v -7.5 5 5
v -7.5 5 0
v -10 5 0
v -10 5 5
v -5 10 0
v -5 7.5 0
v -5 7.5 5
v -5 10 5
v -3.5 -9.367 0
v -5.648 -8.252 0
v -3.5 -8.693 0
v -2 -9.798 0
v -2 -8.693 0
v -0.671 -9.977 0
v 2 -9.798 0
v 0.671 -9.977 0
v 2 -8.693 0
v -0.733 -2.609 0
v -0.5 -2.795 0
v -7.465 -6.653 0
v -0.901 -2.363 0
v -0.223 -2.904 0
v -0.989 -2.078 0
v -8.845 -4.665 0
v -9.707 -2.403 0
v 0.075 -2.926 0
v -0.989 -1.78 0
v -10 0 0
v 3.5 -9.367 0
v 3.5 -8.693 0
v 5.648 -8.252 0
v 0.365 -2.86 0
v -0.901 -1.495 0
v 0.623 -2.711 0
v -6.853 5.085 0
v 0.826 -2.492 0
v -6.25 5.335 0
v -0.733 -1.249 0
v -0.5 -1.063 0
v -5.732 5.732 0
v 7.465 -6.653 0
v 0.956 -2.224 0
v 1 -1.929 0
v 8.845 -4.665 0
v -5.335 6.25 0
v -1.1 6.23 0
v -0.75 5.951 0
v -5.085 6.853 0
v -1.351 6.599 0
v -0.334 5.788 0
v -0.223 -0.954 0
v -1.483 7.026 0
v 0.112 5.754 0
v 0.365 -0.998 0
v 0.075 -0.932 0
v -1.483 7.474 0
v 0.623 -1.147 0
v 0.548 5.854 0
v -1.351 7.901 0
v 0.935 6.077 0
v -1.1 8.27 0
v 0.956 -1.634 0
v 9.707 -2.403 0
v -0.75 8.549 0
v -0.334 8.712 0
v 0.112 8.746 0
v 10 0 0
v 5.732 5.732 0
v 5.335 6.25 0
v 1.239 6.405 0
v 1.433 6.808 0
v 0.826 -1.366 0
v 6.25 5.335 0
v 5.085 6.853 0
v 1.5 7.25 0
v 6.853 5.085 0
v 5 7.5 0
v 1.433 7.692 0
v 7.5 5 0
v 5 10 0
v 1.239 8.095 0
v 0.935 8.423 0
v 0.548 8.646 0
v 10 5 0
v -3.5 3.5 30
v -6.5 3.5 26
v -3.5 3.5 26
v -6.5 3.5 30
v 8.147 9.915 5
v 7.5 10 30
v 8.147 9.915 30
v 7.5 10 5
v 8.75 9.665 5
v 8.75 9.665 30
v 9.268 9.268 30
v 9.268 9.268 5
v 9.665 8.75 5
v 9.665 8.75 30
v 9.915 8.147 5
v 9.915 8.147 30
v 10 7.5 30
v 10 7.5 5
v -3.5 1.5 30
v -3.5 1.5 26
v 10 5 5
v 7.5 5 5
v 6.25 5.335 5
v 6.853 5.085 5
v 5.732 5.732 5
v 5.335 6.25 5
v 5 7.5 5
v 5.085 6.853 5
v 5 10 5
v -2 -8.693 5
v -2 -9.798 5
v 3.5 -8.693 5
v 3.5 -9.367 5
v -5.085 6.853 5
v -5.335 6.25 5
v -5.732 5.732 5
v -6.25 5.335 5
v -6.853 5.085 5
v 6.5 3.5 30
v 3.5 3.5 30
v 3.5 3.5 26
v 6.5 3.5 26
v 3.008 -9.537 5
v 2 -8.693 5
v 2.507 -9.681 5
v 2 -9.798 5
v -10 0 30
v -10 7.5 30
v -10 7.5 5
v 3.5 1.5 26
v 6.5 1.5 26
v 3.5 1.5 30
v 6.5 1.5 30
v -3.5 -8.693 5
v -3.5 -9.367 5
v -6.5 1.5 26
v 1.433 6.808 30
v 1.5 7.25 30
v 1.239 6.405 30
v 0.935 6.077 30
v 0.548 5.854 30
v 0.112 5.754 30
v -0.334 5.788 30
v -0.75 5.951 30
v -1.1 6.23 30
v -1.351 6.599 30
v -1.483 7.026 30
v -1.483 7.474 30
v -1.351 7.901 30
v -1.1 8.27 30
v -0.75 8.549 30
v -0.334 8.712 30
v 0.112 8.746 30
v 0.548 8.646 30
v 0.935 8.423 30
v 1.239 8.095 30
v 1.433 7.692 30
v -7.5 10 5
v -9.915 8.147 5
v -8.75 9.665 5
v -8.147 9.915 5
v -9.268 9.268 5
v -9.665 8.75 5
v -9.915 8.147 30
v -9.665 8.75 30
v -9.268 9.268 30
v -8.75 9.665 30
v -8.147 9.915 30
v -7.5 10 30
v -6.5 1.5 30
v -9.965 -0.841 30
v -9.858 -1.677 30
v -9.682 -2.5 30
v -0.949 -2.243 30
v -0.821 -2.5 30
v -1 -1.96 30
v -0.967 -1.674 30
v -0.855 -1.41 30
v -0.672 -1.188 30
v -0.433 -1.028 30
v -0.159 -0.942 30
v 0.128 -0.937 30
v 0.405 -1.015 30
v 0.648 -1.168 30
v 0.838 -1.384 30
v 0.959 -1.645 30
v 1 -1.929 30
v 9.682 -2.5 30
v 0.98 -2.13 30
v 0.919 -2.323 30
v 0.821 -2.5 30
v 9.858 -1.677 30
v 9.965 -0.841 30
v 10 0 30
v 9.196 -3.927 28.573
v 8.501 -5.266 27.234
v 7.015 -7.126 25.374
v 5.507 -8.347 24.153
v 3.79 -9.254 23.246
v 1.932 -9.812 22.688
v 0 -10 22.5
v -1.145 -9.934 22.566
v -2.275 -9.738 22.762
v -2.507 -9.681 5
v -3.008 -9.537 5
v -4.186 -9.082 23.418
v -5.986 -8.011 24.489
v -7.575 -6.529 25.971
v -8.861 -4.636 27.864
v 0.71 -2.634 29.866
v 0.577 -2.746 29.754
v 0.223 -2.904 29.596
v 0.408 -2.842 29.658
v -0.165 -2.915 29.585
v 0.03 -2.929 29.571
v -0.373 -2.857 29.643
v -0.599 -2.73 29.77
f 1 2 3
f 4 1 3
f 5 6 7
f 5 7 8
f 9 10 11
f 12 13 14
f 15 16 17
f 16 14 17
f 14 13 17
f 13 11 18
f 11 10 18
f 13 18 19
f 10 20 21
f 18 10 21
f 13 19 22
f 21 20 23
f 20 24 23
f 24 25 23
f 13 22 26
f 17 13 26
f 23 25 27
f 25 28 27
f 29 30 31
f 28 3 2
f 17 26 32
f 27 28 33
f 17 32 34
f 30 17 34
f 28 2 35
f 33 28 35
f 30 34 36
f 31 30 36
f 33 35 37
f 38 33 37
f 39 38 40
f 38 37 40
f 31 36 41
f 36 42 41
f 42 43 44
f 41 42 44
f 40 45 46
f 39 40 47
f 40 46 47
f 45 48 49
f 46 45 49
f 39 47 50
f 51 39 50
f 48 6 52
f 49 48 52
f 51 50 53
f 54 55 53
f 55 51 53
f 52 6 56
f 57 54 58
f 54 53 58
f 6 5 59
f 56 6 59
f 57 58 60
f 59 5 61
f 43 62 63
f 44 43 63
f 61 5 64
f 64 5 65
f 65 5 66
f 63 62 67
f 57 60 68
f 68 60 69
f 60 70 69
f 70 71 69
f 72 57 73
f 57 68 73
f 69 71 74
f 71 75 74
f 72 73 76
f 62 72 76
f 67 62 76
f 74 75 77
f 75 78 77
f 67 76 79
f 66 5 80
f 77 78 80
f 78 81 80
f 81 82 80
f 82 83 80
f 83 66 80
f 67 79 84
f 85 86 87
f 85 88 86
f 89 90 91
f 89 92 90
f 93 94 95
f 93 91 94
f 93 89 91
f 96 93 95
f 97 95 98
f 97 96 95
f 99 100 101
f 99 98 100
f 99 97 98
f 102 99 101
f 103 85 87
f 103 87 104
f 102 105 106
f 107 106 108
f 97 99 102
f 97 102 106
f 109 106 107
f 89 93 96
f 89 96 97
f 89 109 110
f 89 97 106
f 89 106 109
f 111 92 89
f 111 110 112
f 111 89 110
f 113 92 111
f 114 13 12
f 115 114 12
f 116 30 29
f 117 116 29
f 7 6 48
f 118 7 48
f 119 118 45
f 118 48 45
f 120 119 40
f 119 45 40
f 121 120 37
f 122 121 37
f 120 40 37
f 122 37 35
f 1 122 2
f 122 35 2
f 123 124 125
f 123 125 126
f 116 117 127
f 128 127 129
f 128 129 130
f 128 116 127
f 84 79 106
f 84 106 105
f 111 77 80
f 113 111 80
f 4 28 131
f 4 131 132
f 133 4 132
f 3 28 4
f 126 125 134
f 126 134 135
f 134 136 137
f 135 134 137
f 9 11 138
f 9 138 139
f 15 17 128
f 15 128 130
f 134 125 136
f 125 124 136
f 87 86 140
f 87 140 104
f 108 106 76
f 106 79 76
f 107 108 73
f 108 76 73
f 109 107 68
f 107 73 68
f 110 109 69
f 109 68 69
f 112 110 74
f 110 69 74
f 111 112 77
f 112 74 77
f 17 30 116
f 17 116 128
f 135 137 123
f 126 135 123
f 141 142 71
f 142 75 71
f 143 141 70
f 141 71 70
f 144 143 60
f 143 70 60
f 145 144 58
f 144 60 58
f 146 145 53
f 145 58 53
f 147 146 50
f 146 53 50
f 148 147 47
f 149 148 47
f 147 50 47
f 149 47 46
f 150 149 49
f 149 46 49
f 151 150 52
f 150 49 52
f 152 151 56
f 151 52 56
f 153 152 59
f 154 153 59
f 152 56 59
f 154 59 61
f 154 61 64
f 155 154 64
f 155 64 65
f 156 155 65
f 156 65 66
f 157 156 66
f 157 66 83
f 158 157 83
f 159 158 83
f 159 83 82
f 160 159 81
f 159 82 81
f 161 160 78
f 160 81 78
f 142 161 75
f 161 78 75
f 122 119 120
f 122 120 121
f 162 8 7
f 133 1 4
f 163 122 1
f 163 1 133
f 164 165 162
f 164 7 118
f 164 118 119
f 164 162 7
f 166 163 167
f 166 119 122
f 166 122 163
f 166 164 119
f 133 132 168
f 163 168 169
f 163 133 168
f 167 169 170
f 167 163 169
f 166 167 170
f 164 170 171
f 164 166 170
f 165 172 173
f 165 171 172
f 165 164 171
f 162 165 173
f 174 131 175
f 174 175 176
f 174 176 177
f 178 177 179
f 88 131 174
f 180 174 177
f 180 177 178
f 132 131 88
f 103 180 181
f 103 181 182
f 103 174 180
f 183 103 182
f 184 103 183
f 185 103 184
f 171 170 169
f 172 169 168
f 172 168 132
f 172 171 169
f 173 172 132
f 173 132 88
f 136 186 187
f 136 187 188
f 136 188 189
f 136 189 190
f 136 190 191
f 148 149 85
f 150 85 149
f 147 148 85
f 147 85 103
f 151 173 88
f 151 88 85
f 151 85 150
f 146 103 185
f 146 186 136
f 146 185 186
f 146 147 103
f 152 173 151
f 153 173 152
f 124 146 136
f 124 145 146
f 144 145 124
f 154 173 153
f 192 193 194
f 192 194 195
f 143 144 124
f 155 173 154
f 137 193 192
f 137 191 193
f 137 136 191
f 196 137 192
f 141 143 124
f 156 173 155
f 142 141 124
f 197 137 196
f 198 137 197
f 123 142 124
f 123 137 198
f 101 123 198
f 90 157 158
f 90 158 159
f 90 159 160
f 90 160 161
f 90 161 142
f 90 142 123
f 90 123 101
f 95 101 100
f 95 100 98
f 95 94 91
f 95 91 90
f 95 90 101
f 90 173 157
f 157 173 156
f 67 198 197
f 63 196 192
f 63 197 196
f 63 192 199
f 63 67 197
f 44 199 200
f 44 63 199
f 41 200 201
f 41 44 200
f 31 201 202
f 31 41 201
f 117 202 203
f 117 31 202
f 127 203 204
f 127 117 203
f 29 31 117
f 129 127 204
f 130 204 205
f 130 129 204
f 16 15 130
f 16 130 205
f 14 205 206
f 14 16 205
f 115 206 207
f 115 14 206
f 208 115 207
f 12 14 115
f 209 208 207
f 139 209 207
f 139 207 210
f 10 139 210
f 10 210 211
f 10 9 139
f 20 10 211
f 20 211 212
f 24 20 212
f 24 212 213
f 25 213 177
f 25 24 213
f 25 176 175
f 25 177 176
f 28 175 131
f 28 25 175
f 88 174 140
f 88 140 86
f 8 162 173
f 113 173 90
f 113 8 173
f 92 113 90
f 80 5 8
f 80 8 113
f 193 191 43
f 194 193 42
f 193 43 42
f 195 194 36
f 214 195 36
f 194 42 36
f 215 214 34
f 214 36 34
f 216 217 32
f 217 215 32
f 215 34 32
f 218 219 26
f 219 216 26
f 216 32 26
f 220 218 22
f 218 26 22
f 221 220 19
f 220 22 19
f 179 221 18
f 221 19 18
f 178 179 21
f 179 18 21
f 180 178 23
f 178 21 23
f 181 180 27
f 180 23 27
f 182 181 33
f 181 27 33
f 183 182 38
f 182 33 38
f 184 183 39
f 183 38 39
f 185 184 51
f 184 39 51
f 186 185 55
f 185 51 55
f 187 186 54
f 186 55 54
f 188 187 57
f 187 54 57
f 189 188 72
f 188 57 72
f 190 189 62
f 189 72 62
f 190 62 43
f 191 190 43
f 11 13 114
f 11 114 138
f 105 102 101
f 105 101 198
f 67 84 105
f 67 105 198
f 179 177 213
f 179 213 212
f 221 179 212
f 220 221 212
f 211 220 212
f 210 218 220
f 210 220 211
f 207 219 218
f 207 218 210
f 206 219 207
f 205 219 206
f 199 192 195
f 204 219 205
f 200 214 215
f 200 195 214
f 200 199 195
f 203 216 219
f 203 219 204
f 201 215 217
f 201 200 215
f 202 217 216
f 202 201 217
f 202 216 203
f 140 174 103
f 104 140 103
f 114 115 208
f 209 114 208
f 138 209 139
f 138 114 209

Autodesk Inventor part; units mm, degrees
ref_plane "YZ Plane" through (0, 0, 0) normal (1, 0, 0) x (0, 1, 0)
ref_plane "XZ Plane" through (0, 0, 0) normal (0, 1, 0) x (-1, 0, 0)
ref_plane "XY Plane" through (0, 0, 0) normal (0, 0, 1) x (1, 0, 0)
sketch "Finger Body" plane through (0, 0, 0) normal (0, 0, 1) x (1, 0, 0)
  line L0 (-10, 10) -> (10, 10)
  line L1 (10, 10) -> (10, -10)
  line L2 (10, -10) -> (-10, -10)
  line L3 (-10, -10) -> (-10, 10)
  arc A0 (-10, 0) -> (10, 0) centre (0, 0) ccw
  line L4 (-10, 0) -> (10, 0)
  circle A1 centre (-7.5, 7.5) radius 2.5
  circle A2 centre (7.5, 7.5) radius 2.5
  circle A3 centre (0, 0) radius 8.75
  line L5 (0, -8.75) -> (1, -8.75) construction
  line L6 (1, 8.6927) -> (1, -8.75)
  line L7 (-1, 8.6927) -> (-1, -8.6927)
  line L8 (-1, -9.9499) -> (-1, -10)
  circle A4 centre (0, 7.25) radius 1.5
  circle A5 centre (0, -1.929) radius 1
  point P0 (1, -8.6927)
  point P1 (10, 7.5)
  point P2 (7.5, 10)
  point P3 (-7.5, 10)
  point P4 (-10, 7.5)
  dimension "d0" = 20
  dimension "d1" = 20
  dimension "d2" = 10
  dimension "d3" = 10
  dimension "d4" = 5
  dimension "d5" = 2.5
  dimension "d6" = 2.5
  dimension "d7" = 5
  dimension "d8" = 2.5
  dimension "d9" = 2.5
  dimension "d10" = 17.5
  dimension "d42" = 3
  dimension "d43" = 0
  dimension "d44" = 0
  dimension "d45" = 9.179
  dimension "d46" = 0
sketch "Cap Imprint (DNE)" plane through (0, 0, 0) normal (0, 0, 1) x (1, 0, 0)
  circle A0 centre (0, 0) radius 8.75 projected
  arc A1 (-10, 0) -> (10, 0) centre (0, 0) ccw projected
  line L0 (-10, -10) -> (-10, 10) projected
  line L1 (-10, 10) -> (10, 10) projected
  line L2 (10, 10) -> (10, -10) projected
  line L3 (1, 8.6927) -> (1, -8.75) projected
  line L4 (-1, 8.6927) -> (-1, -8.6927) projected
  circle A2 centre (-7.5, 7.5) radius 2.5 projected
  circle A3 centre (7.5, 7.5) radius 2.5 projected
  circle A4 centre (0, 0) radius 0.5
  dimension "d15" = 1
extrude "FingerLength (Scale for each finger)" add sketch "Finger Body" along normal blind 30 contours L0 A2 A3 A1 | A1 A3 | A1 A3 L4 L3 | A2 A3 | L4 A3 A0 | A3 A1 | A1 A3 L7 A4 L4 | L1 L4 A3 A2 | A3 A2 | A2 A3 L4 L6 A4 | L4 L7 A3 | L6 A4 A3 | A3 A4 L7 | L7 A4 L6 L4 | L4 L6 A5 L7 | L7 A5 L6 A3 | A3 L6 L4
sketch "Sketch3" plane through (0, 0, 30) normal (0, 0, 1) x (1, 0, 0)
  arc A0 (-7.5, 10) -> (-10, 7.5) centre (-7.5, 7.5) ccw projected
  line L0 (-10, 7.5) -> (-7, 7.5)
  line L1 (-7, 7.5) -> (-6.5, 7.5)
  line L2 (-6.5, 7.5) -> (-3.5, 7.5)
  line L3 (-3.5, 7.5) -> (-3, 7.5)
  arc A1 (10, 7.5) -> (7.5, 10) centre (7.5, 7.5) ccw projected
  line L4 (10, 7.5) -> (7, 7.5)
  line L5 (7, 7.5) -> (6.5, 7.5)
  line L6 (6.5, 7.5) -> (3.5, 7.5)
  line L7 (3.5, 7.5) -> (3, 7.5)
  line L8 (-6.5, 7.5) -> (-3.5, 7.5)
  line L9 (-3.5, 7.5) -> (-3.5, -2.5)
  line L10 (-3.5, -2.5) -> (-6.5, -2.5)
  line L11 (-6.5, -2.5) -> (-6.5, 7.5)
  line L12 (6.5, 7.5) -> (3.5, 7.5)
  line L13 (3.5, 7.5) -> (3.5, -2.5)
  line L14 (3.5, -2.5) -> (6.5, -2.5)
  line L15 (6.5, -2.5) -> (6.5, 7.5)
  line L16 (-6.5, 2.5) -> (6.5, 2.5)
  line L17 (-6.5, 3.5) -> (6.5, 3.5)
  line L18 (-6.5, 1.5) -> (6.5, 1.5)
  point P0 (0, 0)
  point P1 (-3.5, 1.5)
  point P2 (-3.5, 3.5)
  point P3 (3.5, 1.5)
  point P4 (3.5, 3.5)
  dimension "d18" = 3
  dimension "d19" = 0.5
  dimension "d20" = 3
  dimension "d21" = 0.5
  dimension "d22" = 3
  dimension "d23" = 0.5
  dimension "d24" = 3
  dimension "d25" = 0.5
  dimension "d26" = 10
  dimension "d27" = 10
  dimension "d28" = 1
  dimension "d29" = 1
extrude "Extrusion2" cut sketch "Sketch3" against normal blind 4 contours L17 L9 L16 L11 | L16 L9 L18 L11 | L17 L15 L16 L13 | L16 L15 L18 L13
sketch "Sketch4" plane through (10, 0, 0) normal (1, 0, 0) x (0, 0, -1)
  line L0 (0, -10) -> (-30, -10) projected
  line L1 (-30, 0) -> (-30, -10) projected
  line L2 (-30, 0) -> (-30, 7.5) projected
  line L3 (-30, 10) -> (-30, 7.5) projected
  line L4 (0, 10) -> (-30, 10) projected
  line L5 (0, 0) -> (0, 7.5) projected
  line L6 (0, 10) -> (0, 7.5) projected
  line L7 (0, 0) -> (0, -10) projected
  line L8 (0, 7.5) -> (-30, 7.5) projected
  line L9 (-30, 7.5) -> (-30, -2.5)
  line L10 (-30, -8.6927) -> (-30, 8.6927) projected
  line L11 (-30, -2.5) -> (-22.5, -10)
  dimension "d32" = 10
  dimension "d33" = 135
extrude "Extrusion3" cut sketch "Sketch4" against normal up to surface (20 mm away) contours L0 L1 L11
sketch "Sketch5" plane through (0, 0, 0) normal (0, 0, -1) x (-1, 0, 0)
  arc A0 (-7.5, 10) -> (-10, 7.5) centre (-7.5, 7.5) ccw projected
  line L0 (-10, 0) -> (-10, 7.5) projected
  arc A1 (-10, 0) -> (10, 0) centre (0, 0) ccw projected
  line L1 (10, 7.5) -> (10, 0) projected
  arc A2 (10, 7.5) -> (7.5, 10) centre (7.5, 7.5) ccw projected
  line L2 (-7.5, 10) -> (7.5, 10) projected
  circle A3 centre (-7.5, 7.5) radius 2.5
  circle A4 centre (7.5, 7.5) radius 2.5
  line L3 (-7.5, 5) -> (-10, 5)
  line L4 (-10, 0) -> (-10, 7.5) projected
  line L5 (7.5, 5) -> (10, 5)
  line L6 (-5, 7.5) -> (-5, 10)
  line L7 (5, 7.5) -> (5, 10)
  line L8 (-1, -8.6927) -> (-1, -9.9499)
  line L9 (1, -8.6927) -> (1, -9.9499)
  line L10 (-2, -8.6927) -> (-2, -9.9499)
  line L11 (-3.5, -8.6927) -> (-3.5, -9.9499)
  line L12 (2, -8.6927) -> (2, -9.9499)
  line L13 (3.5, -8.6927) -> (3.5, -9.9499)
  line L14 (-3.5, -8.6927) -> (-2, -8.6927)
  line L15 (2, -8.6927) -> (3.5, -8.6927)
  point P0 (2, -9.798)
  point P1 (3.5, -9.3675)
  point P2 (-3.5, -9.3675)
  point P3 (-2, -9.798)
  dimension "d38" = 1
  dimension "d39" = 1.5
  dimension "d40" = 1
  dimension "d41" = 1.5
extrude "Extrusion4" cut sketch "Sketch5" against normal blind 5 contours A3 A0 | L2 L6 A3 | A3 L3 L0 | L2 A4 L7 | A2 A4 | L11 L14 L10 A1 | L1 L5 A4 | A1 L12 L15 L13
sketch "End Imprint (DNE)" plane through (0, 0, 0) normal (0, 0, -1) x (-1, 0, 0)
  line L0 (-5, 10) -> (-5, 7.5) projected
  arc A0 (-7.5, 5) -> (-5, 7.5) centre (-7.5, 7.5) ccw projected
  line L1 (-7.5, 5) -> (-10, 5) projected
  line L2 (-10, 0) -> (-10, 5) projected
  arc A1 (-10, 0) -> (-3.5, -9.3675) centre (0, 0) ccw projected
  line L3 (-3.5, -9.3675) -> (-3.5, -8.6927) projected
  line L4 (-3.5, -8.6927) -> (-2, -8.6927) projected
  line L5 (-2, -8.6927) -> (-2, -9.798) projected
  arc A2 (-2, -9.798) -> (2, -9.798) centre (0, 0) ccw projected
  line L6 (2, -9.798) -> (2, -8.6927) projected
  line L7 (2, -8.6927) -> (3.5, -8.6927) projected
  line L8 (3.5, -8.6927) -> (3.5, -9.3675) projected
  arc A3 (3.5, -9.3675) -> (10, 0) centre (0, 0) ccw projected
  line L9 (10, 5) -> (10, 0) projected
  line L10 (10, 5) -> (7.5, 5) projected
  arc A4 (5, 7.5) -> (7.5, 5) centre (7.5, 7.5) ccw projected
  line L11 (5, 7.5) -> (5, 10) projected
  line L12 (-5, 10) -> (5, 10) projected
  arc A5 (-7.5, 5) -> (-5, 7.5) centre (-7.5, 7.5) ccw projected
  line L13 (-5, 10) -> (-5, 7.5) projected
  line L14 (-7.5, 10) -> (-5, 10) projected
  arc A6 (-7.5, 10) -> (-10, 7.5) centre (-7.5, 7.5) ccw projected
  line L15 (-10, 5) -> (-10, 7.5) projected
  line L16 (-7.5, 5) -> (-10, 5) projected
  arc A7 (10, 7.5) -> (7.5, 10) centre (7.5, 7.5) ccw projected
  line L17 (5, 10) -> (7.5, 10) projected
  line L18 (5, 7.5) -> (5, 10) projected
  arc A8 (5, 7.5) -> (7.5, 5) centre (7.5, 7.5) ccw projected
  line L19 (10, 5) -> (7.5, 5) projected
  line L20 (10, 7.5) -> (10, 5) projected
  line L21 (2, -9.798) -> (2, -8.6927) projected
  arc A9 (2, -9.798) -> (3.5, -9.3675) centre (0, 0) ccw projected
  line L22 (3.5, -8.6927) -> (3.5, -9.3675) projected
  line L23 (2, -8.6927) -> (3.5, -8.6927) projected
  line L24 (-3.5, -9.3675) -> (-3.5, -8.6927) projected
  arc A10 (-3.5, -9.3675) -> (-2, -9.798) centre (0, 0) ccw projected
  line L25 (-2, -8.6927) -> (-2, -9.798) projected
  line L26 (-3.5, -8.6927) -> (-2, -8.6927) projected
properties part number "Fingertip Midpart"
